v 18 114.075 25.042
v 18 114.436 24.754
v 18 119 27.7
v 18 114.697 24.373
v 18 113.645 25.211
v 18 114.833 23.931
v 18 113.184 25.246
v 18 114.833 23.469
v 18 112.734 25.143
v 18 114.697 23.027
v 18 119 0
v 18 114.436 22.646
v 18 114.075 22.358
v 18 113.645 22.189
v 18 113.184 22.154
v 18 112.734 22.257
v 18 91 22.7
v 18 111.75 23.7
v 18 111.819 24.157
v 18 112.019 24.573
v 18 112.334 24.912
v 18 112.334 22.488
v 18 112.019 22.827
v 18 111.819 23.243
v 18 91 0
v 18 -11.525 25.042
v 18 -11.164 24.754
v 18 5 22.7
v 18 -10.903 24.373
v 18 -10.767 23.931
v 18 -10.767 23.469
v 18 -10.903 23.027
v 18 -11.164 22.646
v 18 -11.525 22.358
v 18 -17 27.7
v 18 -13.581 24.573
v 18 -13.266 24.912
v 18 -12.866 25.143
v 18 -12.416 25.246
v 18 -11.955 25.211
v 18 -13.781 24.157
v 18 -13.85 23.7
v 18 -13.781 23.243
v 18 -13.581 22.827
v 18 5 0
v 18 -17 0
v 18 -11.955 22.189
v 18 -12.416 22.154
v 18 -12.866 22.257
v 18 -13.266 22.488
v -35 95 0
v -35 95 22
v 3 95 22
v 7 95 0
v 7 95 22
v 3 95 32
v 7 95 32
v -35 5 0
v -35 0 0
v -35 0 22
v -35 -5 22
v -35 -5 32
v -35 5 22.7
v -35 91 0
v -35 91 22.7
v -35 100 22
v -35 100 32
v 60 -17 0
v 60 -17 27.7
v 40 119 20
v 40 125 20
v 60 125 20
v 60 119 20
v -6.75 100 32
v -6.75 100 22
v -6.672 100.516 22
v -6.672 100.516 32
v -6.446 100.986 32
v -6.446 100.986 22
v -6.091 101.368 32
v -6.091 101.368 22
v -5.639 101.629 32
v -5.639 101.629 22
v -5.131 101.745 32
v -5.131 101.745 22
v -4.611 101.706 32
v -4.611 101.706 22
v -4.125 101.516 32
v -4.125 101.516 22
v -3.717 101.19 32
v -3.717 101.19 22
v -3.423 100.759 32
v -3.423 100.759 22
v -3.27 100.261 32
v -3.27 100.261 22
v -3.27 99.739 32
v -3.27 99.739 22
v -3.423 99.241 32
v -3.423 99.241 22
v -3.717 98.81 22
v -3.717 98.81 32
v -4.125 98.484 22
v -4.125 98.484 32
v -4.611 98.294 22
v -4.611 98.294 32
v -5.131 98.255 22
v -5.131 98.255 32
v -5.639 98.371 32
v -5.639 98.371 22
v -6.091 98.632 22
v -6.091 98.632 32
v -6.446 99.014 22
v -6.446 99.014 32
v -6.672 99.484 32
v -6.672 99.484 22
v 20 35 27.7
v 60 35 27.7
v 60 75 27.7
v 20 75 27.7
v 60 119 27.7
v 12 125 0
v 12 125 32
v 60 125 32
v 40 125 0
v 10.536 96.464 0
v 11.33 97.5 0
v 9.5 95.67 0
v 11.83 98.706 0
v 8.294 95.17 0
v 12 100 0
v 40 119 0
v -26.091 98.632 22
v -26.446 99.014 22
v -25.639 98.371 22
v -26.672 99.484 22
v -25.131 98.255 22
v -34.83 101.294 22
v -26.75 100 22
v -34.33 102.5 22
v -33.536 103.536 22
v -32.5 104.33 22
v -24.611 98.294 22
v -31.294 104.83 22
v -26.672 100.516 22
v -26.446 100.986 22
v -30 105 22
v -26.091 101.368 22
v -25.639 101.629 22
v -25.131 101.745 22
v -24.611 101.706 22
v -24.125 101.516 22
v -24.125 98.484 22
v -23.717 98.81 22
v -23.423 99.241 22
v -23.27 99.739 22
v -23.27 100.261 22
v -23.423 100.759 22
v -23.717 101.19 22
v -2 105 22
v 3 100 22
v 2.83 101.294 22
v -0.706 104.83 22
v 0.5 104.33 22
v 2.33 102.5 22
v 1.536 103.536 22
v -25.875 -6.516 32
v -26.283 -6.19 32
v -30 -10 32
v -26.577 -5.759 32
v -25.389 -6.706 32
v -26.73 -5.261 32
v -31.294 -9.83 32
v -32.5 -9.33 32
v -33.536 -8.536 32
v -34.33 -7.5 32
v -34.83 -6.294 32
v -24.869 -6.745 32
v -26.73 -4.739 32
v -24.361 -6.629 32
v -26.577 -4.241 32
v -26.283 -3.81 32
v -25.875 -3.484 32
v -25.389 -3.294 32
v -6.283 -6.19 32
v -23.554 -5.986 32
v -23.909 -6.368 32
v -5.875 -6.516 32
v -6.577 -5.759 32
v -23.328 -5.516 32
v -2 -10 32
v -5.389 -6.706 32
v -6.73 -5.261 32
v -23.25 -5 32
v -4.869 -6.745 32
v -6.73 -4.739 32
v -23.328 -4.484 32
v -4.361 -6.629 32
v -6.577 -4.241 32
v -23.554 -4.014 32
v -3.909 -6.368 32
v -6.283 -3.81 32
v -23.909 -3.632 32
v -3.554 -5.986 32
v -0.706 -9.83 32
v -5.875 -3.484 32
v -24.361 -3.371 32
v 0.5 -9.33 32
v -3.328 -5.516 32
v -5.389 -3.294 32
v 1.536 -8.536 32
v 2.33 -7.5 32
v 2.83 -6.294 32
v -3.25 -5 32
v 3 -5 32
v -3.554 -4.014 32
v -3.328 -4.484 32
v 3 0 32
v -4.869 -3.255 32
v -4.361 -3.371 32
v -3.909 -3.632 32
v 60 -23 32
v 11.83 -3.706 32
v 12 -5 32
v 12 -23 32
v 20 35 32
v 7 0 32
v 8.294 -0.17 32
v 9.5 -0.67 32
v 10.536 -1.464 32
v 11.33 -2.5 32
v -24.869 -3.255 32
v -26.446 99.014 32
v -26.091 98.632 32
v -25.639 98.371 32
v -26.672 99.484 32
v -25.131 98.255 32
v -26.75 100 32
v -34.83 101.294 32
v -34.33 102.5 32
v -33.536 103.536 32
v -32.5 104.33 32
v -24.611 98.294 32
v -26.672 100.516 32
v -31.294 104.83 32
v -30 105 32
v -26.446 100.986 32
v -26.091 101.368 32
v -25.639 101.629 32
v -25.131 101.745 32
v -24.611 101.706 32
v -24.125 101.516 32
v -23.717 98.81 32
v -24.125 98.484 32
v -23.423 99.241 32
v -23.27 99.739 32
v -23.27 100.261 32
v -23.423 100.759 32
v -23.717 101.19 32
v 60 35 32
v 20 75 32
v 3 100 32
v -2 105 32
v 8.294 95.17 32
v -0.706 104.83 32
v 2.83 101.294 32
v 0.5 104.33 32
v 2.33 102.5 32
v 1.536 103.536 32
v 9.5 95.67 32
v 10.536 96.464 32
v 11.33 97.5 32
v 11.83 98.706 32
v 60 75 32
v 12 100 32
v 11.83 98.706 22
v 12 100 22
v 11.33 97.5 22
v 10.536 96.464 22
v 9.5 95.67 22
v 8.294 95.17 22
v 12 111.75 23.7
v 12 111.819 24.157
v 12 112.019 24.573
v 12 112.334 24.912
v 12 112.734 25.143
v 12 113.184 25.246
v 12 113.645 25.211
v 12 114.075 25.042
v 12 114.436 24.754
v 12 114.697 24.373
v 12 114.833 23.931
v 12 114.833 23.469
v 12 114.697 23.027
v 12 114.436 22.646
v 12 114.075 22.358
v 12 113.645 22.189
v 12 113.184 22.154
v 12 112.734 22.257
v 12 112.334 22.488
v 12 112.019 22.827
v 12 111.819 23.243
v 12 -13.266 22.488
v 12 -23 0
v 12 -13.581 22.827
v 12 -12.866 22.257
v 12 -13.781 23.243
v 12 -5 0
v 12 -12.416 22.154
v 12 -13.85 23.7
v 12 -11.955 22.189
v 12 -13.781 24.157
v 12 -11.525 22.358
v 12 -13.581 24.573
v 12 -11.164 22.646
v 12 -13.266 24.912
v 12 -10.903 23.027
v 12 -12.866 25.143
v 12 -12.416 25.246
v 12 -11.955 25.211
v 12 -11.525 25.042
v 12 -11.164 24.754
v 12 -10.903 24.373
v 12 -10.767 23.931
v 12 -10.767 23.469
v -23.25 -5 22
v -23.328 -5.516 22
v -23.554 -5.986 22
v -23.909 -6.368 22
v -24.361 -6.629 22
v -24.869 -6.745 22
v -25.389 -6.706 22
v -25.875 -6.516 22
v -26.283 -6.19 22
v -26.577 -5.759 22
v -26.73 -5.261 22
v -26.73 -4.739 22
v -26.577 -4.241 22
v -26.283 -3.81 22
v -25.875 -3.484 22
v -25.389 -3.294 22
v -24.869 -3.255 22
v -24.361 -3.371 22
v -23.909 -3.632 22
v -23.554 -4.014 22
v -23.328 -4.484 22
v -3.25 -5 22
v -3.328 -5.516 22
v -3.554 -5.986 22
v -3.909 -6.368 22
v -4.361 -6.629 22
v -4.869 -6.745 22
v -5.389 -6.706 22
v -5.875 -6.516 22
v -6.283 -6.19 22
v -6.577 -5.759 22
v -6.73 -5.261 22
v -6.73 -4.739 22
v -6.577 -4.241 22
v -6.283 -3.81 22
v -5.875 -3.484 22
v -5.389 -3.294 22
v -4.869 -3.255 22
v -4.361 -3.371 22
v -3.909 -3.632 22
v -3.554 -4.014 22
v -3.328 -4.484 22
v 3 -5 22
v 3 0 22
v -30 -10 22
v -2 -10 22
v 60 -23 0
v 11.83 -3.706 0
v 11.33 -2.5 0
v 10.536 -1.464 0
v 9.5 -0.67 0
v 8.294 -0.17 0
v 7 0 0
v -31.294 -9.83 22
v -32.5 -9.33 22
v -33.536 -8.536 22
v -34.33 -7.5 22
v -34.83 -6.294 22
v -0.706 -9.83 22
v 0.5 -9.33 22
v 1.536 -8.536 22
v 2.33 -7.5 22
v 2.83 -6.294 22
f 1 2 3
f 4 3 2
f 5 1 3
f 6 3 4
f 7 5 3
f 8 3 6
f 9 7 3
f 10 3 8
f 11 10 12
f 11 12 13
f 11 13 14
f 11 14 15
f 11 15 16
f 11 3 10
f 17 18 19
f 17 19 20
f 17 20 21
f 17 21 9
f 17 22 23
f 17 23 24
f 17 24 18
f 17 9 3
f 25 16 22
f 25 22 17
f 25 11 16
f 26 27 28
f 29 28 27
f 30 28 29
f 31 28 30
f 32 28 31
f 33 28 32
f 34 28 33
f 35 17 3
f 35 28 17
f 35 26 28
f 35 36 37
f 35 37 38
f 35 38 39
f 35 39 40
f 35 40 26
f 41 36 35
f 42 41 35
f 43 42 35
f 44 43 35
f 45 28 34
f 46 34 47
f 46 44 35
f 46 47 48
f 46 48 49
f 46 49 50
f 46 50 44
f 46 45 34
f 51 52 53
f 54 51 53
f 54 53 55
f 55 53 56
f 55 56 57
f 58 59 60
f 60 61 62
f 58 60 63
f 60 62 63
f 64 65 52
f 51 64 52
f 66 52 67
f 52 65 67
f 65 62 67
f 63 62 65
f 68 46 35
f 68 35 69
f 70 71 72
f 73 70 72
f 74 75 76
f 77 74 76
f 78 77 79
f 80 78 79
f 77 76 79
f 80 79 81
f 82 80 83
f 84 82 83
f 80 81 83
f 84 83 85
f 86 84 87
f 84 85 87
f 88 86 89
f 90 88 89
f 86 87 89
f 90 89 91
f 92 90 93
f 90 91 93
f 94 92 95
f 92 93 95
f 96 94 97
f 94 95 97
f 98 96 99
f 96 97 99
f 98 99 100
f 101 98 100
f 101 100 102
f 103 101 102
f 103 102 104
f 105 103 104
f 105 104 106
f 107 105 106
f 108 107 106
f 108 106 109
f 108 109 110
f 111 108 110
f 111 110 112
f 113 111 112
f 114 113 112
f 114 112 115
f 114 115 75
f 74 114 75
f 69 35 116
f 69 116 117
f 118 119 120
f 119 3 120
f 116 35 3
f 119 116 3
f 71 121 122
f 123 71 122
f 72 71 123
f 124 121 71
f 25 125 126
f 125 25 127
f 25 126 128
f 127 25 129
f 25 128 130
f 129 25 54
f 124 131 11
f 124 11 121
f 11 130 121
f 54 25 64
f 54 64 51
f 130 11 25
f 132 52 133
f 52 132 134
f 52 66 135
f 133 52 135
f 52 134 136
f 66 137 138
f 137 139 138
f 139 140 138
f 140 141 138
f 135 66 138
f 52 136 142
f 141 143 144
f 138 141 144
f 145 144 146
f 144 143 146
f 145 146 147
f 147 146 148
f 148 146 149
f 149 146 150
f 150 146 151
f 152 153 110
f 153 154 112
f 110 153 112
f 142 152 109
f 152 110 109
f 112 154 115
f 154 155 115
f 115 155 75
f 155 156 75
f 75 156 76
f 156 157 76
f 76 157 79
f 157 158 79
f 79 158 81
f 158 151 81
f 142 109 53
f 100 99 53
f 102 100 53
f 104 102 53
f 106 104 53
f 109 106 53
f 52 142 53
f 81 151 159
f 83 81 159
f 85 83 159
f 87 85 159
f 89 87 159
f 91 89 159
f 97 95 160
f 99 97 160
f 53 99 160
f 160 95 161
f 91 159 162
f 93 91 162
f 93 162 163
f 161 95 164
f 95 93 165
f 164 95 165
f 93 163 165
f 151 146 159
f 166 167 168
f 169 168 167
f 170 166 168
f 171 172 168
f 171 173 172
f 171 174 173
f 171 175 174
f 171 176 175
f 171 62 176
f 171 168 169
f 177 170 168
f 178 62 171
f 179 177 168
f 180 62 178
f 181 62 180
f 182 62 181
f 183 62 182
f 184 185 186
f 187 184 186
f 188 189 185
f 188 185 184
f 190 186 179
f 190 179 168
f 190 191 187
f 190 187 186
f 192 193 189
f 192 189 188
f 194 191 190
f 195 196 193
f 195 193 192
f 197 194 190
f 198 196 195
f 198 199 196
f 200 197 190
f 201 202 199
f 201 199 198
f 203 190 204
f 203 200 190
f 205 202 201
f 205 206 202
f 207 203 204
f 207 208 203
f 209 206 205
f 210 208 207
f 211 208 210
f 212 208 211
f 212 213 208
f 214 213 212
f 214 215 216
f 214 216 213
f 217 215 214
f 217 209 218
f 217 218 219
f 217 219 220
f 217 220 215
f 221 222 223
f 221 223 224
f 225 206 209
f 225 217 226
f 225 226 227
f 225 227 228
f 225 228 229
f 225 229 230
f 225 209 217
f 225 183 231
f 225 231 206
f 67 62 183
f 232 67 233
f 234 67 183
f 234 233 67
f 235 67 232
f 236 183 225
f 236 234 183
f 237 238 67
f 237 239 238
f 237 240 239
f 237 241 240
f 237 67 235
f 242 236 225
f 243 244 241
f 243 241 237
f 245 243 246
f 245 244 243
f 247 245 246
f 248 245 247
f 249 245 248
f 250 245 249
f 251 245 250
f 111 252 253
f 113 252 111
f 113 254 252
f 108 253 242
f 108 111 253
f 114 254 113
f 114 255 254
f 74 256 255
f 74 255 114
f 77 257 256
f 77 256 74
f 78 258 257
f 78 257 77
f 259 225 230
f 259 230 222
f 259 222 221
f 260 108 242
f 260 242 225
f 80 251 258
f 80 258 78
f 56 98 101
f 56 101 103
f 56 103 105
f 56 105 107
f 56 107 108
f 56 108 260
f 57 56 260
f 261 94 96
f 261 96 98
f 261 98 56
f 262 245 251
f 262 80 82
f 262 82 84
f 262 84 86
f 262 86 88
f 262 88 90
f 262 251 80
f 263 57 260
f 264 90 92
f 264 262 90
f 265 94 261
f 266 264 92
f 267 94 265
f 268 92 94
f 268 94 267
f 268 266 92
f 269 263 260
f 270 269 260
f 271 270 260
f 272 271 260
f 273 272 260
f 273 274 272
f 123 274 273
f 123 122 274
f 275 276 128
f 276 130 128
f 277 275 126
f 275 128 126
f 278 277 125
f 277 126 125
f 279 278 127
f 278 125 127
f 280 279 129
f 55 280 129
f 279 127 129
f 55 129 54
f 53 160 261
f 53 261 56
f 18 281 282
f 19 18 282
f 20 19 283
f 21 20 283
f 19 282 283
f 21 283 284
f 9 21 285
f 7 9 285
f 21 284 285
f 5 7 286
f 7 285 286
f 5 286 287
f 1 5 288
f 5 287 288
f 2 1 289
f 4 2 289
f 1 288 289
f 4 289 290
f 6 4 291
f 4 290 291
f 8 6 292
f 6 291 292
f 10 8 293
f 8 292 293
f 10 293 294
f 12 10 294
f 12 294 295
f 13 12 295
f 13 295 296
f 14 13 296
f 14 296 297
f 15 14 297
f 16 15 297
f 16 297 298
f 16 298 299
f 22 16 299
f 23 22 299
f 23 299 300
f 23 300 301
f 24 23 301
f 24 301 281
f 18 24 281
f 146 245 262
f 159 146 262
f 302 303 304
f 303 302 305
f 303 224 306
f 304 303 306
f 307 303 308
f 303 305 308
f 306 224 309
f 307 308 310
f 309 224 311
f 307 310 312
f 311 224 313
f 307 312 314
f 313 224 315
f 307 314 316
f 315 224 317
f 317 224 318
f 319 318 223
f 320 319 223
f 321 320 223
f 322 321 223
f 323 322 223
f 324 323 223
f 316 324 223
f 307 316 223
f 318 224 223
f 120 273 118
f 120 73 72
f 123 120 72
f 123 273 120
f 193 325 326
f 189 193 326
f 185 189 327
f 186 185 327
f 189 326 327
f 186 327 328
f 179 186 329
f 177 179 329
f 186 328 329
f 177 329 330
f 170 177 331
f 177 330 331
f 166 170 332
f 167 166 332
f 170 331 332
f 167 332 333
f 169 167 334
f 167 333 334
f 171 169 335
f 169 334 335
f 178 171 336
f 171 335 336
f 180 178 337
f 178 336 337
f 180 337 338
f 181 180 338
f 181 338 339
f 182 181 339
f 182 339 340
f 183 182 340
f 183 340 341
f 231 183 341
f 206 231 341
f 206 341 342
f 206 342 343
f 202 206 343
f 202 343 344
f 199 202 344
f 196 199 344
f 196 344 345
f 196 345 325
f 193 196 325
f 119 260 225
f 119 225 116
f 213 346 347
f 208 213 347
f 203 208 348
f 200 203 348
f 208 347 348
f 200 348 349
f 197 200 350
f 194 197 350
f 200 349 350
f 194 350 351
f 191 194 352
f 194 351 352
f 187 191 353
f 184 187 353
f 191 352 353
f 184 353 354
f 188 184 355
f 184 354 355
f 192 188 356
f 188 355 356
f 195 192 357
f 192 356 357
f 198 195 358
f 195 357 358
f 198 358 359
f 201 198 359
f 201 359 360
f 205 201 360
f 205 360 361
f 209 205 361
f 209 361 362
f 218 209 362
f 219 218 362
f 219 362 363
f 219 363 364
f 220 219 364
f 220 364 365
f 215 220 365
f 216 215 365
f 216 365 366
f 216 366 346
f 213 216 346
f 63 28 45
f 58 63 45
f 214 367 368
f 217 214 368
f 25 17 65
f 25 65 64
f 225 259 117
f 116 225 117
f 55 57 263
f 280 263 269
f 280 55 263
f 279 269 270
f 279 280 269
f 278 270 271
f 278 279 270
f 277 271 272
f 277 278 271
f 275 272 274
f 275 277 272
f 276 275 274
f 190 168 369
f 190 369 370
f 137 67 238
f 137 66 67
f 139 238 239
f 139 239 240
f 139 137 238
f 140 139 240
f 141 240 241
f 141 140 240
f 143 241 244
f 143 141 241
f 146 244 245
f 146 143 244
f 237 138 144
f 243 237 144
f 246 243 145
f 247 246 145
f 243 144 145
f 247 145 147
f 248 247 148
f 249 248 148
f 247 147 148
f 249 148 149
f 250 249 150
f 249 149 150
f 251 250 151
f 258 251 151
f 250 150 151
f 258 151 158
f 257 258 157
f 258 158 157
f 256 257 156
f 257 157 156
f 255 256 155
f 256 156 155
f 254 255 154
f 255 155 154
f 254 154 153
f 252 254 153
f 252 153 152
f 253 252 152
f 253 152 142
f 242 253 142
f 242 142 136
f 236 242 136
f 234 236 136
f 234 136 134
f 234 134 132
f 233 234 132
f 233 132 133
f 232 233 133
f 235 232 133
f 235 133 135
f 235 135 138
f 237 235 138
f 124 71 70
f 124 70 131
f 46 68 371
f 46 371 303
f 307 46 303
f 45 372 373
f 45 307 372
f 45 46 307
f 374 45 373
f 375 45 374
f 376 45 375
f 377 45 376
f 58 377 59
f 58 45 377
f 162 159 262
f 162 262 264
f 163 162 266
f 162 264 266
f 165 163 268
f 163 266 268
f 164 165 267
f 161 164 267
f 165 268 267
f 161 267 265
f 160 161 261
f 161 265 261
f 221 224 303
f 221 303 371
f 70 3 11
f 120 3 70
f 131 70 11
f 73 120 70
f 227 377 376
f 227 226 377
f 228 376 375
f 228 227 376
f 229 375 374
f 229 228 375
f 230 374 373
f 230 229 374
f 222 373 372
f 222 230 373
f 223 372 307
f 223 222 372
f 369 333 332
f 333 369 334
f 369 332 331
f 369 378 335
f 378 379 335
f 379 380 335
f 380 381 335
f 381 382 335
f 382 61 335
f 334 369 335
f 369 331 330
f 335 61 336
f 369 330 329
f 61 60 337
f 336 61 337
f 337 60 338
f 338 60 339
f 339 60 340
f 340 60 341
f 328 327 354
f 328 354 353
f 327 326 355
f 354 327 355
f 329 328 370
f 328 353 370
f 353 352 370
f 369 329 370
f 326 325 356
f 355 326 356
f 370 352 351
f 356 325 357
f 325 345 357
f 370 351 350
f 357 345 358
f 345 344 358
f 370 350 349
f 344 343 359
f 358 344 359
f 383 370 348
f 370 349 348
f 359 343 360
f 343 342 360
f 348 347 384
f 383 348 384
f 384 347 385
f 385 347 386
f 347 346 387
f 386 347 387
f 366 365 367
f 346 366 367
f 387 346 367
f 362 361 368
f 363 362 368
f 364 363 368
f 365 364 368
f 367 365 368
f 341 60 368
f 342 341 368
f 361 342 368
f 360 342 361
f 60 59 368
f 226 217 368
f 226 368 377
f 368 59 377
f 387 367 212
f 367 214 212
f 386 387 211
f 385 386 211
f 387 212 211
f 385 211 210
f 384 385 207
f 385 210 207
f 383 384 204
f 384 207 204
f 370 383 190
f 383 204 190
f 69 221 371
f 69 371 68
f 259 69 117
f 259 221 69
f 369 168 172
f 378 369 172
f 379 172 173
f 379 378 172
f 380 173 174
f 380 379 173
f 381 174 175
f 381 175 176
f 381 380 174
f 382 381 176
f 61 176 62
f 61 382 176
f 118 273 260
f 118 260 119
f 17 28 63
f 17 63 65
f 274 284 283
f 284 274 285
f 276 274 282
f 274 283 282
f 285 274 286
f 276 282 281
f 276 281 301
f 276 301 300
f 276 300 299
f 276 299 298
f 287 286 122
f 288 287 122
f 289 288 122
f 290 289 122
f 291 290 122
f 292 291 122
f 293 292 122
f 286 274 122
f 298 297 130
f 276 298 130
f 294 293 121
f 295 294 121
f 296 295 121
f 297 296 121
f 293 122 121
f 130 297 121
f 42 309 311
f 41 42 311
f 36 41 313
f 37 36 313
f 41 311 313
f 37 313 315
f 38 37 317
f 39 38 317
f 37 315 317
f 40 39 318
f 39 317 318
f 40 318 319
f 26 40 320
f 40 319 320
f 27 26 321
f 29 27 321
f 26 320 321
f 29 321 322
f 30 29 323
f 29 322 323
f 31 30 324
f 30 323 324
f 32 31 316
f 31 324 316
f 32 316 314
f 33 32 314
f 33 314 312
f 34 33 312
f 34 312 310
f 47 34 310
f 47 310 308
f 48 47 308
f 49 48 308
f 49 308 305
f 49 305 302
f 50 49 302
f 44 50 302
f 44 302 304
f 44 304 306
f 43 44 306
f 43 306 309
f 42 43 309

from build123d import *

# Parameters (mm, degrees)
SKETCH_1_W                = 130
SKETCH_1_H                = 64
EXTRUDE_1_DEPTH           = 125
SKETCH_2_W                = 55.4
SKETCH_2_H                = 114
CUT_EXTRUDE_1_DEPTH       = 47
SKETCH_3_W                = 45.4
SKETCH_3_H                = 86
CUT_EXTRUDE_2_DEPTH       = 78
SKETCH_4_W                = 24.038907643
SKETCH_4_H                = 40
CUT_EXTRUDE_3_DEPTH       = 40
SKETCH_5_W                = 4.3
SKETCH_5_H                = 25
CUT_EXTRUDE_4_DEPTH       = 25
SKETCH_6_W                = 10
SKETCH_6_H                = 40
CUT_EXTRUDE_5_DEPTH       = 35
SKETCH_9_W                = 5
SKETCH_9_H                = 125
CUT_EXTRUDE_8_DEPTH       = 155.744951452
SKETCH_10_W               = 20
SKETCH_10_H               = 150
EXTRUDE_2_DEPTH           = 5
SKETCH_11_R               = 2.5
CUT_EXTRUDE_9_DEPTH       = 159.941026799
FILLET_1_R                = 3
SKETCH_12_W               = 32
SKETCH_12_H               = 30
CUT_EXTRUDE_10_DEPTH      = 161.864073055
SKETCH_13_W               = 45
SKETCH_13_H               = 50
CUT_EXTRUDE_11_DEPTH      = 30
FILLET_5_R                = 5
SKETCH_14_W               = 32
SKETCH_14_H               = 150
CUT_EXTRUDE_12_DEPTH      = 185.946613919
SKETCH_16_W               = 14.899109585
SKETCH_16_H               = 40
CUT_EXTRUDE_14_DEPTH      = 40
CUT_EXTRUDE_15_DEPTH      = 143.707007536
CUT_EXTRUDE_15_DEPTH_BACK = 143.707007536
SKETCH_17_W               = 30
SKETCH_17_H               = 95
SKETCH_18_W               = 20
SKETCH_18_H               = 6
CUT_EXTRUDE_16_DEPTH      = 150.244765402
SKETCH_20_W               = 47
SKETCH_20_H               = 10
EXTRUDE_3_DEPTH           = 10
SKETCH_21_R               = 1.75
CUT_EXTRUDE_17_DEPTH      = 141.388745988
SKETCH_23_W               = 42
SKETCH_23_H               = 27.7
CUT_EXTRUDE_19_DEPTH      = 138.927517197
EXTRUDE_4_DEPTH           = 27.7
SKETCH_25_W               = 48
SKETCH_25_H               = 23
EXTRUDE_5_DEPTH           = 4.3
FILLET_6_R                = 5
FILLET_8_R                = 5
CUT_EXTRUDE_23_DEPTH      = 10
SKETCH_31_R               = 1.55
CUT_EXTRUDE_24_DEPTH      = 138.669895039
FILLET_9_R                = 5
FILLET_10_R               = 5
FILLET_11_R               = 5


with BuildPart() as part:
    # 草图1 → 凸台-拉伸1 (new body)
    with BuildSketch(Plane(origin=(0, 0, 0), x_dir=(1, 0, 0), z_dir=(0, 1, 0))):
        Rectangle(SKETCH_1_W, SKETCH_1_H)
    extrude(amount=EXTRUDE_1_DEPTH)

    # 草图2 → 切除-拉伸1 (cut)
    with BuildSketch(Plane(origin=(65, 0, 0), x_dir=(0, 0, -1), z_dir=(1, 0, 0))):
        with Locations((0, 62)):
            Rectangle(SKETCH_2_W, SKETCH_2_H)
    extrude(amount=-CUT_EXTRUDE_1_DEPTH, mode=Mode.SUBTRACT)

    # 草图3 → 切除-拉伸2 (cut)
    with BuildSketch(Plane(origin=(18, 0, 0), x_dir=(0, 0, -1), z_dir=(1, 0, 0))):
        with Locations((0, 48)):
            Rectangle(SKETCH_3_W, SKETCH_3_H)
    extrude(amount=-CUT_EXTRUDE_2_DEPTH, mode=Mode.SUBTRACT)

    # 草图4 → 切除-拉伸3 (cut)
    with BuildSketch(Plane(origin=(65, 0, 0), x_dir=(0, 0, -1), z_dir=(1, 0, 0))):
        with Locations((26.569318974, 55)):
            Rectangle(SKETCH_4_W, SKETCH_4_H)
    extrude(amount=-CUT_EXTRUDE_3_DEPTH, mode=Mode.SUBTRACT)

    # 草图5 → 切除-拉伸4 (cut)
    with BuildSketch(Plane(origin=(65, 0, 0), x_dir=(0, 0, -1), z_dir=(1, 0, 0))):
        with Locations((29.85, 87.5)):
            Rectangle(SKETCH_5_W, SKETCH_5_H)
    extrude(amount=-CUT_EXTRUDE_4_DEPTH, mode=Mode.SUBTRACT)

    # 草图6 → 切除-拉伸5 (cut)
    with BuildSketch(Plane(origin=(0, 125, 0), x_dir=(1, 0, 0), z_dir=(0, 1, 0))):
        with Locations((45, 0)):
            Rectangle(SKETCH_6_W, SKETCH_6_H)
    extrude(amount=-CUT_EXTRUDE_5_DEPTH, mode=Mode.SUBTRACT)

    # 草图9 → 切除-拉伸8 (cut, through all)
    with BuildSketch(Plane.XY.offset(32)):
        with Locations((62.5, 62.5)):
            Rectangle(SKETCH_9_W, SKETCH_9_H)
    extrude(amount=-CUT_EXTRUDE_8_DEPTH, mode=Mode.SUBTRACT)

    # 草图10 → 凸台-拉伸2 (add)
    with BuildSketch(Plane(origin=(0, 0, -32), x_dir=(-1, 0, 0), z_dir=(0, 0, -1))):
        with Locations((15, 57.5)):
            Rectangle(SKETCH_10_W, SKETCH_10_H)
    extrude(amount=-EXTRUDE_2_DEPTH)

    # 草图11 → 切除-拉伸9 (cut, through all)
    with BuildSketch(Plane.XY.offset(-27)):
        with Locations((-15, -12)):
            Circle(SKETCH_11_R)
        with Locations((-15, 137)):
            Circle(SKETCH_11_R)
    extrude(amount=-CUT_EXTRUDE_9_DEPTH, mode=Mode.SUBTRACT)

    # 圆角1
    fillet_1_edges = [part.edges().sort_by_distance(p)[0] for p in [
        (-15, 0, -27),
        (-5, 0, -29.5),
        (-25, 0, -29.5),
        (-25, 132.5, -29.5),
        (-25, 125, -29.5),
        (-5, 125, -29.5),
        (-15, 125, -27),
        (-25, -17.5, -29.5),
        (-5, -17.5, -29.5),
        (-5, 132.5, -29.5),
    ]]
    fillet(fillet_1_edges, radius=FILLET_1_R)

    # 草图12 → 切除-拉伸10 (cut, through all)
    with BuildSketch(Plane.XY.offset(32)):
        with Locations((-49, 110)):
            Rectangle(SKETCH_12_W, SKETCH_12_H)
    extrude(amount=-CUT_EXTRUDE_10_DEPTH, mode=Mode.SUBTRACT)

    # 草图13 → 切除-拉伸11 (cut)
    with BuildSketch(Plane(origin=(0, 125, 0), x_dir=(1, 0, 0), z_dir=(0, 1, 0))):
        with Locations((-10.5, -7)):
            Rectangle(SKETCH_13_W, SKETCH_13_H)
    extrude(amount=-CUT_EXTRUDE_11_DEPTH, mode=Mode.SUBTRACT)

    # 圆角5
    fillet_5_edges = [part.edges().sort_by_distance(p)[0] for p in [
        (-33, 110, -18),
        (12, 110, -18),
    ]]
    fillet(fillet_5_edges, radius=FILLET_5_R)

    # 草图14 → 切除-拉伸12 (cut, through all)
    with BuildSketch(Plane.ZY.offset(65)):
        with Locations((-16, 57.5)):
            Rectangle(SKETCH_14_W, SKETCH_14_H)
    extrude(amount=-CUT_EXTRUDE_12_DEPTH, mode=Mode.SUBTRACT)

    # 草图16 → 切除-拉伸14 (cut)
    with BuildSketch(Plane(origin=(60, 0, 0), x_dir=(0, 0, -1), z_dir=(1, 0, 0))):
        with Locations((-29.056746571, 55)):
            Rectangle(SKETCH_16_W, SKETCH_16_H)
    extrude(amount=-CUT_EXTRUDE_14_DEPTH, mode=Mode.SUBTRACT)

    # 草图17 → 切除-拉伸15 (cut, two sides: drawn at the far end of the back side and taken through both)
    with BuildSketch(Plane(origin=(0, 0, 22.7), x_dir=(-1, 0, 0), z_dir=(0, 0, -1)).offset(-CUT_EXTRUDE_15_DEPTH_BACK)):
        with Locations((50, 47.5)):
            Rectangle(SKETCH_17_W, SKETCH_17_H)
    extrude(amount=CUT_EXTRUDE_15_DEPTH + CUT_EXTRUDE_15_DEPTH_BACK, mode=Mode.SUBTRACT)

    # 草图18 → 切除-拉伸16 (cut, through all)
    with BuildSketch(Plane(origin=(40, 0, 0), x_dir=(0, 0, -1), z_dir=(1, 0, 0))):
        with Locations((-10, 122)):
            Rectangle(SKETCH_18_W, SKETCH_18_H)
    extrude(amount=CUT_EXTRUDE_16_DEPTH, mode=Mode.SUBTRACT)

    # 草图20 → 凸台-拉伸3 (add)
    with BuildSketch(Plane.XY.offset(32)):
        with Locations((-11.5, -5)):
            Rectangle(SKETCH_20_W, SKETCH_20_H)
        with Locations((-11.5, 100)):
            Rectangle(SKETCH_20_W, SKETCH_20_H)
    extrude(amount=-EXTRUDE_3_DEPTH)

    # 草图21 → 切除-拉伸17 (cut, through all)
    with BuildSketch(Plane(origin=(0, 0, 22), x_dir=(-1, 0, 0), z_dir=(0, 0, -1))):
        with Locations(Location((25, -5, 0), (0, 0, 180))):
            Circle(SKETCH_21_R)
        with Locations(Location((5, -5, 0), (0, 0, 180))):
            Circle(SKETCH_21_R)
        with Locations((5, 100)):
            Circle(SKETCH_21_R)
        with Locations((25, 100)):
            Circle(SKETCH_21_R)
    extrude(amount=-CUT_EXTRUDE_17_DEPTH, mode=Mode.SUBTRACT)

    # 草图23 → 切除-拉伸19 (cut, through all)
    with BuildSketch(Plane(origin=(0, 5, 0), x_dir=(1, 0, 0), z_dir=(0, 1, 0))):
        with Locations((39, -13.85)):
            Rectangle(SKETCH_23_W, SKETCH_23_H)
    extrude(amount=-CUT_EXTRUDE_19_DEPTH, mode=Mode.SUBTRACT)

    # 草图24 → 凸台-拉伸4 (add)
    with BuildSketch(Plane(origin=(0, 0, 0), x_dir=(-1, 0, 0), z_dir=(0, 0, -1))):
        Polygon((-18, 0), (-18, -17), (-60, -17), (-60, -23), (-12, -23), (-12, 0), align=None)
    extrude(amount=-EXTRUDE_4_DEPTH)

    # 草图25 → 凸台-拉伸5 (add)
    with BuildSketch(Plane.XY.offset(32)):
        with Locations((36, -11.5)):
            Rectangle(SKETCH_25_W, SKETCH_25_H)
    extrude(amount=-EXTRUDE_5_DEPTH)

    # 圆角6
    fillet_6_edges = [part.edges().sort_by_distance(p)[0] for p in [
        (-35, 105, 27),
        (12, 105, 27),
        (-35, -10, 27),
        (12, -10, 27),
    ]]
    fillet(fillet_6_edges, radius=FILLET_6_R)

    # 圆角8
    fillet_8_edges = [part.edges().sort_by_distance(p)[0] for p in [
        (12, 95, 11),
    ]]
    fillet(fillet_8_edges, radius=FILLET_8_R)

    # 草图30 → 切除-拉伸23 (cut)
    with BuildSketch(Plane(origin=(0, 0, 22), x_dir=(-1, 0, 0), z_dir=(0, 0, -1))):
        with BuildLine():
            Line((-7, 105), (-3, 105))
            Line((-3, 105), (-3, 95))
            Line((-3, 95), (-7, 95))
            ThreePointArc((-7, 95), (-10.535533906, 96.464466094), (-12, 100))
            Line((-12, 100), (-12, 110))
            ThreePointArc((-12, 110), (-10.535533906, 106.464466094), (-7, 105))
        make_face()
        with BuildLine():
            Line((-7, -10), (-3, -10))
            Line((-3, -10), (-3, 0))
            Line((-3, 0), (-12, 0))
            Line((-12, 0), (-12, -15))
            ThreePointArc((-12, -15), (-10.535533906, -11.464466094), (-7, -10))
        make_face()
    extrude(amount=-CUT_EXTRUDE_23_DEPTH, mode=Mode.SUBTRACT)

    # 草图31 → 切除-拉伸24 (cut, through all)
    with BuildSketch(Plane.ZY.offset(-12)):
        with Locations(Location((23.7, 113.3, 0), (0, 0, 270))):
            Circle(SKETCH_31_R)
        with Locations(Location((23.7, -12.3, 0), (0, 0, 270))):
            Circle(SKETCH_31_R)
    extrude(amount=-CUT_EXTRUDE_24_DEPTH, mode=Mode.SUBTRACT)

    # 圆角9
    fillet_9_edges = [part.edges().sort_by_distance(p)[0] for p in [
        (12, 0, 16),
    ]]
    fillet(fillet_9_edges, radius=FILLET_9_R)

    # 圆角10
    fillet_10_edges = [part.edges().sort_by_distance(p)[0] for p in [
        (3, -10, 27),
    ]]
    fillet(fillet_10_edges, radius=FILLET_10_R)

    # 圆角11
    fillet_11_edges = [part.edges().sort_by_distance(p)[0] for p in [
        (3, 105, 27),
    ]]
    fillet(fillet_11_edges, radius=FILLET_11_R)


solid = part.part
